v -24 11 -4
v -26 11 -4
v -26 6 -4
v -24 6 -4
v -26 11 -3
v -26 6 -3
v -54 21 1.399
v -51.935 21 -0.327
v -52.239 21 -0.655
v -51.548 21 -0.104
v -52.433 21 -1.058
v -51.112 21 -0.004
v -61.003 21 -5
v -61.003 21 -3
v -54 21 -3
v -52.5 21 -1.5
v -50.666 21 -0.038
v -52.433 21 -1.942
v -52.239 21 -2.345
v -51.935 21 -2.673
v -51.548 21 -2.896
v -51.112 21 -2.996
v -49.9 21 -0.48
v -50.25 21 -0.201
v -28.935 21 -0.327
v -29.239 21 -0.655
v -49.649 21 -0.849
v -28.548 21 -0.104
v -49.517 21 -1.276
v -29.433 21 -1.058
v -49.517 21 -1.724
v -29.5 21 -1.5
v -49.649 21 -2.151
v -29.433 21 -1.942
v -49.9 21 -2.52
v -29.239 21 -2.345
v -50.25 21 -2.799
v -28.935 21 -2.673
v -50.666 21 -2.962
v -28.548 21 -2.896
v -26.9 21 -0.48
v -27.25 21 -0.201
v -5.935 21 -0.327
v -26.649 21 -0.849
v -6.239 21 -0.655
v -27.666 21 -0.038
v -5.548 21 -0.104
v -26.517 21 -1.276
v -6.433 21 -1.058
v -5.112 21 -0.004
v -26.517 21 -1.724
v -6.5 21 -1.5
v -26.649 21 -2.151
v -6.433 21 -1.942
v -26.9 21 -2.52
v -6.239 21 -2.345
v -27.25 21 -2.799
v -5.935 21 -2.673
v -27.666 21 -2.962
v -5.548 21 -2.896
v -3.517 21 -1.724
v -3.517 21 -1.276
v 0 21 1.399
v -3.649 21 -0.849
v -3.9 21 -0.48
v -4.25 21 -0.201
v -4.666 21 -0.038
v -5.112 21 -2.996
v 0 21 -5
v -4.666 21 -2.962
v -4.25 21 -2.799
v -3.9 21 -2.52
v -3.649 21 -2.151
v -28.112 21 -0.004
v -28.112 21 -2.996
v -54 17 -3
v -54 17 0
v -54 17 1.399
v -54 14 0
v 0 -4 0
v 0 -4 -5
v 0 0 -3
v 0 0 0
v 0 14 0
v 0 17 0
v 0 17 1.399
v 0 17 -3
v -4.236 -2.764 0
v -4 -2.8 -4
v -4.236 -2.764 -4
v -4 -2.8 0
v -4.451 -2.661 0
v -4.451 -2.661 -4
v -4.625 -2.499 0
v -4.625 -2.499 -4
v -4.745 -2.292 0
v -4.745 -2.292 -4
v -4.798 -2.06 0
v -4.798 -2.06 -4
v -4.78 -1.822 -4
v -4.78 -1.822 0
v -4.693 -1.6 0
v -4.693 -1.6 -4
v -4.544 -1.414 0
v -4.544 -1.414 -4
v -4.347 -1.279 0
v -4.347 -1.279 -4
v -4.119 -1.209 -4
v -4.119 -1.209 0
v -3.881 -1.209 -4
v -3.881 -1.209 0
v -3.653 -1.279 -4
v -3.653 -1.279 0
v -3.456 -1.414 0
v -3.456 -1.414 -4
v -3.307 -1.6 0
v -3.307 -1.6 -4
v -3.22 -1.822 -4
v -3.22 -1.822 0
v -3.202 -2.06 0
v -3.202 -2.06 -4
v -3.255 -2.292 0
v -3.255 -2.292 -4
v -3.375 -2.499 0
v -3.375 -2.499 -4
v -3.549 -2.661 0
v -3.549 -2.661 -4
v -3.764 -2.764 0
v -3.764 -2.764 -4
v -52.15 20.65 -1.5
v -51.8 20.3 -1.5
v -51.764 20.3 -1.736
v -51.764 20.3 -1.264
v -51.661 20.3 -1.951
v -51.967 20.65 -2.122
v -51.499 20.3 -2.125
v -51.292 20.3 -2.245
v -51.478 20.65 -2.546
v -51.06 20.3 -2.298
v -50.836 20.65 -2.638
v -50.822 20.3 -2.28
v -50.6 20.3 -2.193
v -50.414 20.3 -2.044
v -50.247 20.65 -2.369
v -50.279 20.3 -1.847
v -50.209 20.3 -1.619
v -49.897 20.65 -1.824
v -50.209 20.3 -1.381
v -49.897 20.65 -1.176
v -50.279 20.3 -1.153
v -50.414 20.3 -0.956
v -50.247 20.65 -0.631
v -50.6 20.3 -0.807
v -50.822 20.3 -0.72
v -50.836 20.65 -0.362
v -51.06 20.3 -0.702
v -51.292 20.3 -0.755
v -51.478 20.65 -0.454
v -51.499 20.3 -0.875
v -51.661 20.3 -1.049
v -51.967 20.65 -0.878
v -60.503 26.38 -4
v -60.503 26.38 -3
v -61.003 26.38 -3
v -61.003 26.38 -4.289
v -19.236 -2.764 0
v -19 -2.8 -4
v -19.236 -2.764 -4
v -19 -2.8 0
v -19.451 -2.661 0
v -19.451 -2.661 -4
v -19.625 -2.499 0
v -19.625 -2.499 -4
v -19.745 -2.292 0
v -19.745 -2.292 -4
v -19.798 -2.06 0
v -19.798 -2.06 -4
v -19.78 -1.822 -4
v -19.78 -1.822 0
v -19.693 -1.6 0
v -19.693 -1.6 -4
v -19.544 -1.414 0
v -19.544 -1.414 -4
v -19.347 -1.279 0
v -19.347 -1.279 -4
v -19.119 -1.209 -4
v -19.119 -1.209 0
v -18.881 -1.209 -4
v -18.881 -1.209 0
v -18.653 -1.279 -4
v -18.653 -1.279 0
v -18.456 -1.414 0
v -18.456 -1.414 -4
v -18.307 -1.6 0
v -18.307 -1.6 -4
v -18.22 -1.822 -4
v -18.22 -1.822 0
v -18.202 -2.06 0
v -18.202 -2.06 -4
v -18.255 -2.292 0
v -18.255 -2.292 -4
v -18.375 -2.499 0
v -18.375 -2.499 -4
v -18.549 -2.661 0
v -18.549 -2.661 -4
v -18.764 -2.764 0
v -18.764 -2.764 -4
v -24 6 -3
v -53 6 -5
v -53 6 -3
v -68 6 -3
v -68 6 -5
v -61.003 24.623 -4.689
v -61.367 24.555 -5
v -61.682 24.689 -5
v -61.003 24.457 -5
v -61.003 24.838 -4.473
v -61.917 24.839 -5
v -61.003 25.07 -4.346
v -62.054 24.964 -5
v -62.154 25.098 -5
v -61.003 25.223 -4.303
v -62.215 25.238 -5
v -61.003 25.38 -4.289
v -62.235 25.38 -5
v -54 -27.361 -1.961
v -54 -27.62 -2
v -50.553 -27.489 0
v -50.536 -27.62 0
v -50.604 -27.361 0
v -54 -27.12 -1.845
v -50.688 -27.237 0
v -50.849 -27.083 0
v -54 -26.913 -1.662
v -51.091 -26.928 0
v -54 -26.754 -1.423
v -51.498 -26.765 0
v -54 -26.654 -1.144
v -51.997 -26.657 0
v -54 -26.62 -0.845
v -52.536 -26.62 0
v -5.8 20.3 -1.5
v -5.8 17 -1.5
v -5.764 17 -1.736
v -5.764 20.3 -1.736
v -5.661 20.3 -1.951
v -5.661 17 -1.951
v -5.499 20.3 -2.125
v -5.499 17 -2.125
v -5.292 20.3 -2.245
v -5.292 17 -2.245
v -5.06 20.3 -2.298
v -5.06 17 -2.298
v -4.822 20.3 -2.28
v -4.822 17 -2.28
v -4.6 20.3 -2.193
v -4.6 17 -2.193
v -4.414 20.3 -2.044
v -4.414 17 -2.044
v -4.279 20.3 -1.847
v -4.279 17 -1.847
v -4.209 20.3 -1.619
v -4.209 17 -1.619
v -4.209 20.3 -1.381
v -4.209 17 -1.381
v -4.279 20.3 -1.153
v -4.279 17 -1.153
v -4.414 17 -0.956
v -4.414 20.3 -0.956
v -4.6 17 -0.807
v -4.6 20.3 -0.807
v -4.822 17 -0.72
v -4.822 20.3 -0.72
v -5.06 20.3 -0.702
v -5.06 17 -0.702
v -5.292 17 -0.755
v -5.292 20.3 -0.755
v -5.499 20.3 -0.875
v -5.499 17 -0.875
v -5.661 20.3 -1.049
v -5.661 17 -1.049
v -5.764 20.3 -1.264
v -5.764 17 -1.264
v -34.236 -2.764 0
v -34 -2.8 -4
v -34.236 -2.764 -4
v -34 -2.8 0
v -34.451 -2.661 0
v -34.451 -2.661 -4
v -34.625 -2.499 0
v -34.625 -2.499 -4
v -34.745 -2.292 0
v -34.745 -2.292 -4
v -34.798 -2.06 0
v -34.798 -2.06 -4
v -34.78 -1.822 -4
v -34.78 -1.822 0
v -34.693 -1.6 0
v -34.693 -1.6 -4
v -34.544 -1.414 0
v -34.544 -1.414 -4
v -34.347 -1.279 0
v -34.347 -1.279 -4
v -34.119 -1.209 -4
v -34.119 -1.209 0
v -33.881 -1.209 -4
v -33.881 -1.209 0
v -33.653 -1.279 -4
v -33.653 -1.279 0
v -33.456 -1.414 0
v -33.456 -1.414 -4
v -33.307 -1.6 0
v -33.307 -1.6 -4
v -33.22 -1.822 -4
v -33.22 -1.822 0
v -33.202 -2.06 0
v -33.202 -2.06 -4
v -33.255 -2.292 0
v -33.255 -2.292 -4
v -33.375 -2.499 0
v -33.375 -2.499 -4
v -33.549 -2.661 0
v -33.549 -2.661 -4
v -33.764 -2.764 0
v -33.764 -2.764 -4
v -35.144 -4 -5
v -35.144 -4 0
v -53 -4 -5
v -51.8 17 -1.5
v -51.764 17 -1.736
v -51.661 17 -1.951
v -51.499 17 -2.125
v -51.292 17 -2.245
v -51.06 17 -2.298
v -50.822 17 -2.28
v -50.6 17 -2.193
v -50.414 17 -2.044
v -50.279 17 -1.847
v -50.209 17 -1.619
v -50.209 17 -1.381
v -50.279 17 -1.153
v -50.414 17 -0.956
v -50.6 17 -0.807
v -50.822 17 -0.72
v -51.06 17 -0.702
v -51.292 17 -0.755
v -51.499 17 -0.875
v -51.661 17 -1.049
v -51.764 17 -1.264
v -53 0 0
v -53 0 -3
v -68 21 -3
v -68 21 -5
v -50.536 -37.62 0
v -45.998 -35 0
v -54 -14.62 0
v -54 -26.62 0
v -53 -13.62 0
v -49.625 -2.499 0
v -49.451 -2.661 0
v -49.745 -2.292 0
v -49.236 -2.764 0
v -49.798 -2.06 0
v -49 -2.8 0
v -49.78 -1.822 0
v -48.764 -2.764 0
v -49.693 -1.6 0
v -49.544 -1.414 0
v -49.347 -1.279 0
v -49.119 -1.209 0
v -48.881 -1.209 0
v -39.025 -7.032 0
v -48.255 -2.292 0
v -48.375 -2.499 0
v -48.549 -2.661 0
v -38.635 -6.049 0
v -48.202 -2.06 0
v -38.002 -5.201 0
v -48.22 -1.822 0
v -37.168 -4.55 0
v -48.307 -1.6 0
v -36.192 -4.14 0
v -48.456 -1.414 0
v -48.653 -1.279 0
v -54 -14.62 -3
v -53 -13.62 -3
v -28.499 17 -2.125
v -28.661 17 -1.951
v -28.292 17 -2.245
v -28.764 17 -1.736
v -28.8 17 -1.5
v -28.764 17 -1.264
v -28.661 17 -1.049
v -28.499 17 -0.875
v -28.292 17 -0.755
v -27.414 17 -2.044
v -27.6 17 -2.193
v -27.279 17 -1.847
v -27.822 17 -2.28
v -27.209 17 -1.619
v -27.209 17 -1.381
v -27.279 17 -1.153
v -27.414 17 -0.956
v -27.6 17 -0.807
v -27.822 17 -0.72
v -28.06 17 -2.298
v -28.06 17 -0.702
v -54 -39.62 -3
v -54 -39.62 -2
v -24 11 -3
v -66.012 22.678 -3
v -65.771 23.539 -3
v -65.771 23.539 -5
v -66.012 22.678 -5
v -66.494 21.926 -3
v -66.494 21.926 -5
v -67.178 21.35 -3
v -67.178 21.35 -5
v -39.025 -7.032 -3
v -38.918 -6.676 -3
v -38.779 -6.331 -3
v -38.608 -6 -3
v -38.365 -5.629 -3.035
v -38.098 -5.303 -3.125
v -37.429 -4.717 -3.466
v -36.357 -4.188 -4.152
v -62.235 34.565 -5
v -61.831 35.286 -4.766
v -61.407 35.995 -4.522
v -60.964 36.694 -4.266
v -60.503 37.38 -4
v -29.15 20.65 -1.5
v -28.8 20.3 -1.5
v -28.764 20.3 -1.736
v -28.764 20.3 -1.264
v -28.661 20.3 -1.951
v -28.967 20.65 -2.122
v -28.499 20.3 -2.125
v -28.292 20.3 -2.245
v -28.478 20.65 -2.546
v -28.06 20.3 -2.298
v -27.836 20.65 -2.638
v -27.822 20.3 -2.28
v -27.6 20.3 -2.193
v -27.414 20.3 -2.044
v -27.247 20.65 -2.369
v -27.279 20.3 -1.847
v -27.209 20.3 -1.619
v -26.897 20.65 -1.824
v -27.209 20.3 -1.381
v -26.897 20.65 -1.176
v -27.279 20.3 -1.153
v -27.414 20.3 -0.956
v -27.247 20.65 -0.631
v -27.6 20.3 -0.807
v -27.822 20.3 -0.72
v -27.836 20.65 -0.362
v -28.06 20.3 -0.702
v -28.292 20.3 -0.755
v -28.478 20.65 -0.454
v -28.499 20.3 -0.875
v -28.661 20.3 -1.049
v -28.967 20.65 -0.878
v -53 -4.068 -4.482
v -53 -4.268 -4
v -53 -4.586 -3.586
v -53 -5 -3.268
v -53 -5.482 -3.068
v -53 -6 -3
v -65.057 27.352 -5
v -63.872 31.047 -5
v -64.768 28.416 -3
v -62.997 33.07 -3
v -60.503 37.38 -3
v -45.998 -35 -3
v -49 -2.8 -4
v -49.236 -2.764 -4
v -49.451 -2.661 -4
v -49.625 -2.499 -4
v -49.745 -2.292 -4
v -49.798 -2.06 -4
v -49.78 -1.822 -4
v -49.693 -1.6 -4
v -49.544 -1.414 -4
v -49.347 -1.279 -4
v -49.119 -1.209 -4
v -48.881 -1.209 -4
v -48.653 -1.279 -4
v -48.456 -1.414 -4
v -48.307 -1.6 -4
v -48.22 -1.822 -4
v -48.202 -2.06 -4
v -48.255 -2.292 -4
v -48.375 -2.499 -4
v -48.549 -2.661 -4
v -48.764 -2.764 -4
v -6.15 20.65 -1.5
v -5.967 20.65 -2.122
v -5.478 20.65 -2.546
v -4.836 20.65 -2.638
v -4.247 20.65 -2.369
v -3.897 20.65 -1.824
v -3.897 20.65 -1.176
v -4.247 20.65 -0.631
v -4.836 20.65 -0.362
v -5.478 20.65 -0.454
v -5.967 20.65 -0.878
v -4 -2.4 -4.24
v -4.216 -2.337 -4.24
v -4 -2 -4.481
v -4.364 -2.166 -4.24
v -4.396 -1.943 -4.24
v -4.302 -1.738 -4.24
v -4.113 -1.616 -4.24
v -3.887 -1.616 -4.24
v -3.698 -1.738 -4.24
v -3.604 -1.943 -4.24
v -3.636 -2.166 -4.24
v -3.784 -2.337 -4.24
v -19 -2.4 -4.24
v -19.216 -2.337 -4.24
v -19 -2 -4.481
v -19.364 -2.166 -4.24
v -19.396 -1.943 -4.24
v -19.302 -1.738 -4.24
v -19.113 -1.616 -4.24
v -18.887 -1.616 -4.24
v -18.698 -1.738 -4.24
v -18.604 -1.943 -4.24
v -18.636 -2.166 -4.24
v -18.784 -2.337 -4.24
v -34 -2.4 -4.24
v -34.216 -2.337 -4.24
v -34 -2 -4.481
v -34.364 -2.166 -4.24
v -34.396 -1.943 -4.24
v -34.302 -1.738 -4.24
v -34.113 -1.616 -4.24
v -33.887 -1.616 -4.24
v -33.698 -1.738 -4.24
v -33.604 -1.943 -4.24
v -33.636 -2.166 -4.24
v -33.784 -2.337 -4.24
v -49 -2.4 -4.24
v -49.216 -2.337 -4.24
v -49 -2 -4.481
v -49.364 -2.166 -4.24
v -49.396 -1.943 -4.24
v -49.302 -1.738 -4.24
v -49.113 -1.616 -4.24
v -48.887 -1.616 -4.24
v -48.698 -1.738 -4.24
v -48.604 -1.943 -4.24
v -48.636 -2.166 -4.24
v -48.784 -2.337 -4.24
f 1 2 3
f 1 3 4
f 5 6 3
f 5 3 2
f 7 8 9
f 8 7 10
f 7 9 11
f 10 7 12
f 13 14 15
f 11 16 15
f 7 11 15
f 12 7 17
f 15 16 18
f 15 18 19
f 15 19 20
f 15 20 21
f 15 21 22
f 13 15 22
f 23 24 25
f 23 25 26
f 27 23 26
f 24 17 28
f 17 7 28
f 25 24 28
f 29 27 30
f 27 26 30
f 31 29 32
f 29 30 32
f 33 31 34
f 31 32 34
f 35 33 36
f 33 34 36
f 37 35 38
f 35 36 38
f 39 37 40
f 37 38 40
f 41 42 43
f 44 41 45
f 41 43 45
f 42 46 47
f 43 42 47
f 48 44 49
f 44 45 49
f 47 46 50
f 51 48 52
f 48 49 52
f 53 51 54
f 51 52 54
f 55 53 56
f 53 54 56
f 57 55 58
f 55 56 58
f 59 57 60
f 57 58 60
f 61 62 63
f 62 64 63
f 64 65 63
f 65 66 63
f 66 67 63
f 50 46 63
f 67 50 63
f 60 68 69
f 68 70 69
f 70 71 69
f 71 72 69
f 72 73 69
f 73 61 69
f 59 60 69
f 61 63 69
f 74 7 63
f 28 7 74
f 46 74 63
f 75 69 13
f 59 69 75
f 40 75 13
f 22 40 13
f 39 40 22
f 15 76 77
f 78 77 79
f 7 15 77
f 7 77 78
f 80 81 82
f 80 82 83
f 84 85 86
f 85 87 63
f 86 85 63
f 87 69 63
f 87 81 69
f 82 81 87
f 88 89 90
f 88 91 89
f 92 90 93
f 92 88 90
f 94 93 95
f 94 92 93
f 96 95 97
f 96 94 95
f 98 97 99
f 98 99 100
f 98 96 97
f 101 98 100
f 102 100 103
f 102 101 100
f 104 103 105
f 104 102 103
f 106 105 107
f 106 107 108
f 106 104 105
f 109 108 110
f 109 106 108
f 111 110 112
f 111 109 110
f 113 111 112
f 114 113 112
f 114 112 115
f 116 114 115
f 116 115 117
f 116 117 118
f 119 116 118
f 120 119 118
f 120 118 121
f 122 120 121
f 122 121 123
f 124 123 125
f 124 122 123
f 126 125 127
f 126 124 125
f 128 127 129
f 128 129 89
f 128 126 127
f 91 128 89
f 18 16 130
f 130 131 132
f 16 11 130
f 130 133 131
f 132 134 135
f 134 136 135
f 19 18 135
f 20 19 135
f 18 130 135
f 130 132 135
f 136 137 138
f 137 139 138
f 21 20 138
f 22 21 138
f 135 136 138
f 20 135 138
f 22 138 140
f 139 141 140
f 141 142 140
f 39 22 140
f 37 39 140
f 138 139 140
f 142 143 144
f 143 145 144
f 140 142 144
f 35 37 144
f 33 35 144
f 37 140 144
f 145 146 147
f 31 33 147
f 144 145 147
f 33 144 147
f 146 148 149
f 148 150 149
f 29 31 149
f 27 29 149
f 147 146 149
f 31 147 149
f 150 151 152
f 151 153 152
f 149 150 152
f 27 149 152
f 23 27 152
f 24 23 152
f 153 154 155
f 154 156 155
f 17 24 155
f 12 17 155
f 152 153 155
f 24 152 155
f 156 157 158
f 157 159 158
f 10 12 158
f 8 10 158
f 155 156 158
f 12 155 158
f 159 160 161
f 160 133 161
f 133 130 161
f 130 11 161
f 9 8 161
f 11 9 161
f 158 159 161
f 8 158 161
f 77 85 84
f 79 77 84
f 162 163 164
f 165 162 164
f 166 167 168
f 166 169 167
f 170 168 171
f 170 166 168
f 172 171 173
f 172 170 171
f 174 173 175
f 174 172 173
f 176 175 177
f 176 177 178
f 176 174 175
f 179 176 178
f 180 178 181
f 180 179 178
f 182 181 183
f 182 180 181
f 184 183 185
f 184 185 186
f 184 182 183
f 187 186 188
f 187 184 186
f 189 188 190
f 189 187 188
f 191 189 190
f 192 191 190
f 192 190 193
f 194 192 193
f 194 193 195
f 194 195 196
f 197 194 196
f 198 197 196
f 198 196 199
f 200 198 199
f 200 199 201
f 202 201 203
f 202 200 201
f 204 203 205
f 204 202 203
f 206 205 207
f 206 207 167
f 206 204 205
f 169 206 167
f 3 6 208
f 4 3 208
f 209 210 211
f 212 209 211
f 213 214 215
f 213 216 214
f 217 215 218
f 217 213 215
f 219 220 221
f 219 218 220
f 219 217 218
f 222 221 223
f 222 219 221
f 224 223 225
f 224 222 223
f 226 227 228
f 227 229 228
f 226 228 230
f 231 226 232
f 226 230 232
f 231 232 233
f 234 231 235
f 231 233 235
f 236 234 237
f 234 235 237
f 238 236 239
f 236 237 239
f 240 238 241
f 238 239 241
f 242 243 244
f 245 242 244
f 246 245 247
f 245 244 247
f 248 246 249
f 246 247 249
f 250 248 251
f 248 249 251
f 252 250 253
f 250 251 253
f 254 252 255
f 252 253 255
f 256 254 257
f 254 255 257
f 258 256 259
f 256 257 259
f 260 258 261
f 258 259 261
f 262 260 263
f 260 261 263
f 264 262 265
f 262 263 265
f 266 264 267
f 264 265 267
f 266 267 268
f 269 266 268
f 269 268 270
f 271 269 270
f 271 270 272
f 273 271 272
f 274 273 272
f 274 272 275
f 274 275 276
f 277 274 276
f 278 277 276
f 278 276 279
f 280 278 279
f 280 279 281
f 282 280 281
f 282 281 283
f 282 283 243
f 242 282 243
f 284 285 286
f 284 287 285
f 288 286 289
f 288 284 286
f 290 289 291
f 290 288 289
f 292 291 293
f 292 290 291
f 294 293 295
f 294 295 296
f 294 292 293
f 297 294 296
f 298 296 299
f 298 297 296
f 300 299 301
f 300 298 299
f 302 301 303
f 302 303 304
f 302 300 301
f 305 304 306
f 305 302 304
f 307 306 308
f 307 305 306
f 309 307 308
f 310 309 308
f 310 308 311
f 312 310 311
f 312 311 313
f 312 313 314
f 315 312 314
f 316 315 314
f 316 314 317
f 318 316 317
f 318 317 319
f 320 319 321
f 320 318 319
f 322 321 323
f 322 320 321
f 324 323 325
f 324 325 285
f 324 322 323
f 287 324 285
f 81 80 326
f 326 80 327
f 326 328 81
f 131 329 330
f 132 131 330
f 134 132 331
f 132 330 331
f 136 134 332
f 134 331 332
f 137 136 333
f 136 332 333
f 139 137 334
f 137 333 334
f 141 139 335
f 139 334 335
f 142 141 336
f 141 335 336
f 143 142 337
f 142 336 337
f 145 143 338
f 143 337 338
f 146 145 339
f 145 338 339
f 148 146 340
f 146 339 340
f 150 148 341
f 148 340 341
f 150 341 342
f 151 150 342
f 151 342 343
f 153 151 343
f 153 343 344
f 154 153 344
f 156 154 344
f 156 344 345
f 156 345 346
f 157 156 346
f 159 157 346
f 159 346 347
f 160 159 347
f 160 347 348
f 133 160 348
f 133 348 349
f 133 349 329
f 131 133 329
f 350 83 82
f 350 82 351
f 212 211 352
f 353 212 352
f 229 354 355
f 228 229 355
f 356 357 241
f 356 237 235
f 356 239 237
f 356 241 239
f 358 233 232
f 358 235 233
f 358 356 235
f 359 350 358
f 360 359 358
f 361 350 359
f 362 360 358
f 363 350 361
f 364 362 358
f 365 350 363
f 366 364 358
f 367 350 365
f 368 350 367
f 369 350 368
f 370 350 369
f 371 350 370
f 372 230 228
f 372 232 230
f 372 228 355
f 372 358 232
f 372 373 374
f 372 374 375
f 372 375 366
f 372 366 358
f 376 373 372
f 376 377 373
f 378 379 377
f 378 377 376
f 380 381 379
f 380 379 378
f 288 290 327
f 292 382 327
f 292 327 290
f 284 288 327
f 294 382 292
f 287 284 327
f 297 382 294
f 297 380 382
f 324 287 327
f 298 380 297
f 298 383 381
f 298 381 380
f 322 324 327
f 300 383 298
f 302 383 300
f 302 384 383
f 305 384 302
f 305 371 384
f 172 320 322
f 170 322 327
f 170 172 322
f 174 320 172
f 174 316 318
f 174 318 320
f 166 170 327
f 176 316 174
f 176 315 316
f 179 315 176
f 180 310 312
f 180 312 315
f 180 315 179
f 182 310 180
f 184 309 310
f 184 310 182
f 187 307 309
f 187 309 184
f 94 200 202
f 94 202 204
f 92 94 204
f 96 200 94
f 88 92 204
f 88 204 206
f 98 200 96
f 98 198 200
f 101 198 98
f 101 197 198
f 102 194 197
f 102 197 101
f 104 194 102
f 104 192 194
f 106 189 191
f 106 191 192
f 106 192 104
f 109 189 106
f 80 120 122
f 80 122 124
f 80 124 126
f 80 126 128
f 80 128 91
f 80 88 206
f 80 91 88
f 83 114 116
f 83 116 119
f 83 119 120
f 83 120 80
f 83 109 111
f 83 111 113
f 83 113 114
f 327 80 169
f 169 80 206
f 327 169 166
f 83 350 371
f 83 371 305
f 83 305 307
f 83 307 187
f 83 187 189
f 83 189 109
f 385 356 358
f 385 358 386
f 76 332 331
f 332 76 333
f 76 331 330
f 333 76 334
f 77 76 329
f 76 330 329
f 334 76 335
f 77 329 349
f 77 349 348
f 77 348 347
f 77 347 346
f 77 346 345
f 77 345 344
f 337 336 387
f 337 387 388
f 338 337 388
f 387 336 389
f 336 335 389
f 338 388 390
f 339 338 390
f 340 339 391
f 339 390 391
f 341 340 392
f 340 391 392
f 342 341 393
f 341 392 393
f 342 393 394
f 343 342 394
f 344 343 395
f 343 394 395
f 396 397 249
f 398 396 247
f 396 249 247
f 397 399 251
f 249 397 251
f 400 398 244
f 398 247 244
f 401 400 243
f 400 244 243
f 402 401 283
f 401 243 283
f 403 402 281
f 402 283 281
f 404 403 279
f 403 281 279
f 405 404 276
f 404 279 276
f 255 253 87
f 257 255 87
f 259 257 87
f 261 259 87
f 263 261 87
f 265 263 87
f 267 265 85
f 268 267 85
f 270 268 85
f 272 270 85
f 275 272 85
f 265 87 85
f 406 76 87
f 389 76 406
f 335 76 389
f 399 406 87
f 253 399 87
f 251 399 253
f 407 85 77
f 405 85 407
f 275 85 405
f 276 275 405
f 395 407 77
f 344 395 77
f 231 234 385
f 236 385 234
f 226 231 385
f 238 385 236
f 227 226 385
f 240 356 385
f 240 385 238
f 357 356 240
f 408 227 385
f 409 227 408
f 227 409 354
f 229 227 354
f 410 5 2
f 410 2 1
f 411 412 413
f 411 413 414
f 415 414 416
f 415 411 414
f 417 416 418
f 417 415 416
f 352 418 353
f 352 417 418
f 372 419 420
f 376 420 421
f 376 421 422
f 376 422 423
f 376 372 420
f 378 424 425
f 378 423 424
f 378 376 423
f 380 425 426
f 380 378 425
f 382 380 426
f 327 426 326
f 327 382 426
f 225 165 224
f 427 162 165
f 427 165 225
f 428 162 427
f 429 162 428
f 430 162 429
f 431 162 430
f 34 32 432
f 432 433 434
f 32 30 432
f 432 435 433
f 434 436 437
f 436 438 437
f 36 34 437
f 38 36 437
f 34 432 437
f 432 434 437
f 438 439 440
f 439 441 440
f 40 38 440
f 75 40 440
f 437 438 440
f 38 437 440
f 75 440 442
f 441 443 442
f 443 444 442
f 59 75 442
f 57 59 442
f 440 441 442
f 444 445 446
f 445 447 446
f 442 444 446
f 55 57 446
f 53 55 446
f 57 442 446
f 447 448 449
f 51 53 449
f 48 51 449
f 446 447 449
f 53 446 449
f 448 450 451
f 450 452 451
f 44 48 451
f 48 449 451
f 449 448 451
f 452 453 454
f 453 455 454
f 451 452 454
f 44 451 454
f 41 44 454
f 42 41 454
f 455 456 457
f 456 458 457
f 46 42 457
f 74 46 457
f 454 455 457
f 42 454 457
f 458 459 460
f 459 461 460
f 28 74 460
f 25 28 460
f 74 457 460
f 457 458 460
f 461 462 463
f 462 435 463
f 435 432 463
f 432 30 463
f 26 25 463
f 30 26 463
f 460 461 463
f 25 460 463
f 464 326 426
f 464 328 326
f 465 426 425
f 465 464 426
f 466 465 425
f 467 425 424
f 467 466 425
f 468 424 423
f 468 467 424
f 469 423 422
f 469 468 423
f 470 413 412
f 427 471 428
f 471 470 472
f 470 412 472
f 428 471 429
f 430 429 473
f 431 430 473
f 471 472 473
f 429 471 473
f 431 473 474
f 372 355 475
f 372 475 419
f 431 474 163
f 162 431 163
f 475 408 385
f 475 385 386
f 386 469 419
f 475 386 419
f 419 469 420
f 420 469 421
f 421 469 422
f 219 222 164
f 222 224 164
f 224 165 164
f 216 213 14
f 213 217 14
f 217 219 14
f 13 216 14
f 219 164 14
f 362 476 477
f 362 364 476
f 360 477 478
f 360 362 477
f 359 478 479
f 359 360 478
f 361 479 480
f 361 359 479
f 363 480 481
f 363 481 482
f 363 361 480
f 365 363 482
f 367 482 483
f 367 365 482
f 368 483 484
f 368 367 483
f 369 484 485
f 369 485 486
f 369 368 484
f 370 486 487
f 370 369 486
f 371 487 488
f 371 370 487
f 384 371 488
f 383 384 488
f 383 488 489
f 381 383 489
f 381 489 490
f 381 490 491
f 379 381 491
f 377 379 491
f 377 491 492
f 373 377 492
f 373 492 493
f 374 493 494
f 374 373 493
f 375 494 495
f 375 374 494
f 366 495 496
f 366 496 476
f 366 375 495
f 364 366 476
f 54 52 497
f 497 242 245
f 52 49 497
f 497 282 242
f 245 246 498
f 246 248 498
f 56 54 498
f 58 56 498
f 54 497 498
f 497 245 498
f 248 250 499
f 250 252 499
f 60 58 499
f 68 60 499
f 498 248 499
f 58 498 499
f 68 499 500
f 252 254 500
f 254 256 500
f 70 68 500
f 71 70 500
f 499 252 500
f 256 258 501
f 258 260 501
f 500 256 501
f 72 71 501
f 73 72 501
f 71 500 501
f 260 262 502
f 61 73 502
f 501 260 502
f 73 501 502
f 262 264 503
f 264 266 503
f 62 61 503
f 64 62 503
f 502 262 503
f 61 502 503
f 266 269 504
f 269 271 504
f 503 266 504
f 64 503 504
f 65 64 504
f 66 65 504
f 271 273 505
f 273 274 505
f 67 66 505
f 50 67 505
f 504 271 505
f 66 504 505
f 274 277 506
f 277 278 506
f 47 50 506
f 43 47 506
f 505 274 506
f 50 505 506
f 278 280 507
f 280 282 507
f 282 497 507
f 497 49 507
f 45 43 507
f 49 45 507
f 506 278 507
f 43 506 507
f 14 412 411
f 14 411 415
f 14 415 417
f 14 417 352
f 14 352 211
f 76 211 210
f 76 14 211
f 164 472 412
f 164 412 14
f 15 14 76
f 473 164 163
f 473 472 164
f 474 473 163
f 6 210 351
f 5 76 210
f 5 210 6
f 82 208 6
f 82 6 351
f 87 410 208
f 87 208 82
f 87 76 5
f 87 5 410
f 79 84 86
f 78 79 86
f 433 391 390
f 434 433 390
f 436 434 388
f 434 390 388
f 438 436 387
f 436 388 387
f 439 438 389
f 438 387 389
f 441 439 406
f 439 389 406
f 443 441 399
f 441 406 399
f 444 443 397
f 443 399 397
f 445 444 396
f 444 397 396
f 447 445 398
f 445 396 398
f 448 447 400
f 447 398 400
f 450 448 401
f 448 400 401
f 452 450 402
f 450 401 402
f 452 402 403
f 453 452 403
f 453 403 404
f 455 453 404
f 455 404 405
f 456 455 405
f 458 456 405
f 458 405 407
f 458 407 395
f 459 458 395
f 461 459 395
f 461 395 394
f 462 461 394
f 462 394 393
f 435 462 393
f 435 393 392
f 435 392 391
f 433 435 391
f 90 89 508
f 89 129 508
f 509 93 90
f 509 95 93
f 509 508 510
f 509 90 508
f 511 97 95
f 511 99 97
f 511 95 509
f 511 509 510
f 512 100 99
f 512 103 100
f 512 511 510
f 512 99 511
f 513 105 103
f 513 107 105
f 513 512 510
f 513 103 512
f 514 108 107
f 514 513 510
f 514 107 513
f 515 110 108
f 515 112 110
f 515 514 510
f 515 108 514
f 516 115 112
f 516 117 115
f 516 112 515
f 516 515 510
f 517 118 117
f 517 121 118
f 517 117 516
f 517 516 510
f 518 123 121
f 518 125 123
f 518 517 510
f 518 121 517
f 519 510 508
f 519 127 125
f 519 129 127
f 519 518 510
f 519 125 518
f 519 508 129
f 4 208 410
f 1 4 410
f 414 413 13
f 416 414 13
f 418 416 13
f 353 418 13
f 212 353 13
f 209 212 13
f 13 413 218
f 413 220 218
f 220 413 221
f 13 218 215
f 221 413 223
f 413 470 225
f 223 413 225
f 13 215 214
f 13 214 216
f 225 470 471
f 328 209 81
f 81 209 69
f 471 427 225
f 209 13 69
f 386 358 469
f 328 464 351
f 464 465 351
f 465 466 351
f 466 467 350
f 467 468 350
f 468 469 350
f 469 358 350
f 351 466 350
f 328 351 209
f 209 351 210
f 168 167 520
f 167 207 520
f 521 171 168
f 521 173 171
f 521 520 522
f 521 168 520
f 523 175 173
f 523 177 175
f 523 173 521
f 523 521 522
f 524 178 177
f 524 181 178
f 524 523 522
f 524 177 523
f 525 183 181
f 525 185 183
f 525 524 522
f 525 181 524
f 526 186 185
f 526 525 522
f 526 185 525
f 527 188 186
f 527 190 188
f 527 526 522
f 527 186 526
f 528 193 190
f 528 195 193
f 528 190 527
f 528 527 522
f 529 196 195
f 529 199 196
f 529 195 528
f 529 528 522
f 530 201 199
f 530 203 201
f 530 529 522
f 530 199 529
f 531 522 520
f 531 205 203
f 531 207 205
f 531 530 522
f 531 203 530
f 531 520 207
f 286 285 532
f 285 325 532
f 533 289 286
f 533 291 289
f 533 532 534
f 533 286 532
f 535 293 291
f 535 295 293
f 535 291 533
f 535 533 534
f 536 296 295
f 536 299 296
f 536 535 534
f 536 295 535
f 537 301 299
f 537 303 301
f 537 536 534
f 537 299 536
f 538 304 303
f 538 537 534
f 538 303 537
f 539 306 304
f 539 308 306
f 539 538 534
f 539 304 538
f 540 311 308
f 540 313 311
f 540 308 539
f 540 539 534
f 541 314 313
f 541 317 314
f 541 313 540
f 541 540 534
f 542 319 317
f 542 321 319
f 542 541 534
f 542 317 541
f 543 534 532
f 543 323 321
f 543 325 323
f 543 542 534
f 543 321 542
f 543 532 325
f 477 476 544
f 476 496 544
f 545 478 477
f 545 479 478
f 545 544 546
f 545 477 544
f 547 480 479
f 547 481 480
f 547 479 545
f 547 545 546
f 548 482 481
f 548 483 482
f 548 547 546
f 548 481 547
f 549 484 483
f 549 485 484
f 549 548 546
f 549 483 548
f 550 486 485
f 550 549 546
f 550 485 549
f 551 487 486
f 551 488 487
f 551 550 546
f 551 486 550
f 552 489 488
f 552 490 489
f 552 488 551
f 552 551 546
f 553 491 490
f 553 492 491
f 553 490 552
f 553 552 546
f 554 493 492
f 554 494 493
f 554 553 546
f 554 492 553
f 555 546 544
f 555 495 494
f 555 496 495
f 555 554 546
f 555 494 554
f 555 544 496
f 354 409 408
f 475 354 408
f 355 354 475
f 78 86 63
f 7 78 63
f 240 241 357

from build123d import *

# Parameters (mm, degrees)
EXTRUDE_1_DEPTH              = 3
EXTRUDE_2_DEPTH              = 2
FILLET_1_R                   = 2
FILLET_2_R                   = 3
CHAMFER_1_SIZE               = 1
EXTRUDE_3_DEPTH              = 54
PATTERN_LINEAR_1_COUNT       = 4
PATTERN_LINEAR_1_PITCH       = 15
HOLE_WIZARD_M2_2_D           = 1.6
HOLE_WIZARD_M2_2_DEPTH       = 4
HOLE_WIZARD_M2_2_CSINK_D     = 3
HOLE_WIZARD_M2_2_CSINK_ANGLE = 90
PATTERN_LINEAR_2_COUNT       = 3
PATTERN_LINEAR_2_PITCH       = 23
CUT_EXTRUDE_1_DEPTH          = 13
FILLET_3_R                   = 1
CUT_EXTRUDE_2_DEPTH          = 13
FILLET_4_R                   = 1
SKETCH_11_W                  = 2.000000000000007
SKETCH_11_H                  = 5
CUT_EXTRUDE_3_DEPTH          = 1


# Some blends are built 0.0001 mm under size
with BuildPart() as part:
    # 草图1 → 凸台-拉伸1 (new body)
    with BuildSketch(Plane.XY):
        with BuildLine():
            Line((-53, -8.000000000000004), (-53, -14.620000000000001))
            Line((-53, -14.620000000000001), (-54, -14.620000000000001))
            Line((-54, -14.620000000000001), (-54, -39.62))
            Line((-54, -39.62), (-45.9979252690319, -35.00000000000001))
            Line((-45.9979252690319, -35.00000000000001), (-39.02479757997029, -7.032312417601319))
            ThreePointArc((-39.02479757997029, -7.032312417601319), (-37.606260576168935, -4.847956985573115), (-35.14361467486631, -4.000000000000005))
            Line((-35.14361467486631, -4.000000000000005), (4.9e-16, -4))
            Line((4.9e-16, -4), (0, 0))
            Line((0, 0), (-53, 0))
            Line((-53, 0), (-53, -8.000000000000004))
        make_face()
    extrude(amount=-EXTRUDE_1_DEPTH)

    # 草图2 → 凸台-拉伸2 (add)
    with BuildSketch(Plane(origin=(0, 0, -3), x_dir=(-1, 0, 0), z_dir=(0, 0, -1))):
        with BuildLine():
            Line((-4.9e-16, -4), (53, -4))
            Line((53, -4), (53, 6.000000000000002))
            Line((53, 6.000000000000002), (68, 6.000000000000002))
            Line((68, 6.000000000000002), (68, 21))
            Line((68, 21), (65.97847727, 21.000000000000004))
            ThreePointArc((65.97847727, 21.000000000000004), (64.40463560690391, 29.57899182713432), (60.50330893032099, 37.379999999999995))
            Line((60.50330893032099, 37.379999999999995), (60.503308930321, 26.379999999999995))
            Line((60.503308930321, 26.379999999999995), (61.003308930321, 26.38))
            Line((61.003308930321, 26.38), (61.003308930321005, 21))
            Line((61.003308930321005, 21), (53, 21))
            Line((53, 21), (0, 21))
            Line((0, 21), (-4.9e-16, -4))
        make_face()
    extrude(amount=EXTRUDE_2_DEPTH)

    # 圆角1
    fillet_1_edges = [part.edges().sort_by_distance(p)[0] for p in [
        (-44.07180733743316, -4, -3),
    ]]
    fillet(fillet_1_edges, radius=FILLET_1_R - 0.0001)  # a hair under: the kernel refuses the full size

    # 圆角2
    # the kernel refuses this fillet: 3 mm, written as the material it adds along each edge
    with BuildSketch(Plane(origin=(-65.97847727, 21.000000000000004, -3), x_dir=(-1, -3.51e-15, 0), z_dir=(0, 0, -1))) as fillet_2_piece_1:
        with BuildLine():
            CenterArc((2.7704921372998013, 2.9050034125503172), FILLET_2_R, 187.01700367904854, 68.52581158586304)
            Line((-0.2070376849391327, 2.5385117241346675), (-0.2665882813839122, 2.531181890366354))
            ThreePointArc((-0.2665882813839122, 2.531181890366354), (-0.13723895323484658, 1.2665056940841235), (-0.05995131454466218, -0.00241658526998755))
            Line((-0.05995131454466218, -0.00241658526998755), (2.1e-16, -0.05999999999999872))
            ThreePointArc((2.1e-16, -0.05999999999999872), (1.0107613649999936, -0.05999999999999517), (2.006543341853998, -0.05810006825100805))
            Line((2.006543341853998, -0.05810006825100805), (2.021522730000001, 0))
        make_face()
    extrude(amount=2)

    # 倒角1
    chamfer_1_edges = [part.edges().sort_by_distance(p)[0] for p in [
        (-53, -14.620000000000001, -1.5),
    ]]
    chamfer(chamfer_1_edges, length=CHAMFER_1_SIZE - 0.0001)  # a hair under: the kernel refuses the full size

    # 草图3 → 凸台-拉伸3 (add)
    with BuildSketch(Plane(origin=(0, 0, 0), x_dir=(0, 0, -1), z_dir=(1, 1.2e-16, 0))):
        Polygon((1.3e-15, 17), (1.73e-15, 14.000000000000002), (-1.3989229744649714, 17), (-1.3989229744649718, 21), (3, 21), (3.0000000000000018, 17), align=None)
    extrude(amount=-EXTRUDE_3_DEPTH)

    # 草图6 → M2 螺纹孔1 (revolve, cut)
    with BuildSketch(Plane(origin=(-4, -1.9999999999999967, 0), x_dir=(0, -1, 0), z_dir=(1, 0, 0))):
        Polygon((0, 0), (-1.1e-15, 4.480688495222049), (0.7999999999999986, 4), (0.7999999999999899, -1.46e-15), align=None)
    hole_wizard_m2_1 = revolve(axis=Axis((-4, -1.9999999999999967, 6.349999999999991), (0, 0, -1)), mode=Mode.SUBTRACT)

    # 阵列(线性)1: M2 螺纹孔1 ×4
    with Locations(*[(-i * PATTERN_LINEAR_1_PITCH, 0, 0) for i in range(1, PATTERN_LINEAR_1_COUNT)]):
        add(hole_wizard_m2_1, mode=Mode.SUBTRACT)

    # M2 螺纹孔2
    with Locations(Plane(origin=(0, 21, 0), x_dir=(1, 0, 0), z_dir=(0, 1, 0))):
        with Locations((-5, 1.5)):
            hole_wizard_m2_2 = CounterSinkHole(HOLE_WIZARD_M2_2_D / 2, HOLE_WIZARD_M2_2_CSINK_D / 2, depth=HOLE_WIZARD_M2_2_DEPTH, counter_sink_angle=HOLE_WIZARD_M2_2_CSINK_ANGLE)

    # 阵列(线性)2: M2 螺纹孔2 ×3
    with Locations(*[(-i * PATTERN_LINEAR_2_PITCH, 0, 0) for i in range(1, PATTERN_LINEAR_2_COUNT)]):
        add(hole_wizard_m2_2, mode=Mode.SUBTRACT)

    # 草图9 → 切除-拉伸1 (cut)
    with BuildSketch(Plane(origin=(3.89e-15, 37.37999999999999, 7.21e-15), x_dir=(1, -1e-16, 0), z_dir=(1e-16, 1, 1.9e-16))):
        Polygon((-60.503308930321, 4.000000000000004), (-62.23535973788988, 5.000000000000007), (-60.503308930321, 5.000000000000007), align=None)
    extrude(amount=-CUT_EXTRUDE_1_DEPTH, mode=Mode.SUBTRACT)

    # 圆角3
    # the kernel refuses this fillet: 1 mm, written as the material it adds along each edge
    with BuildSketch(Plane(origin=(-58.8382454208599, 24.379999999999995, -3.0386751345948144), x_dir=(1.6e-16, 1, 9e-17), z_dir=(-0.8660254037844387, 0, -0.5))) as fillet_3_piece_1_section:
        with BuildLine():
            CenterArc((FILLET_3_R, FILLET_3_R), FILLET_3_R, 179.99999999999997, 90)
            Line((0, FILLET_3_R), (0, 0))
            Line((0, 0), (FILLET_3_R, 0))
        make_face()
    fillet_3_piece_1 = extrude(amount=6.422649730810377, mode=Mode.PRIVATE)
    fillet_3_piece_1 = split(fillet_3_piece_1, bisect_by=Plane(origin=(-61.495158067637725, 24.669870904160934, -5), z_dir=(0, 0, 1)), keep=Keep.TOP, mode=Mode.PRIVATE)
    fillet_3_piece_1 = split(fillet_3_piece_1, bisect_by=Plane(origin=(-61.003308930321, 24.669870904160934, -4.716030766640193), z_dir=(-1, 1.32e-15, 0)), keep=Keep.TOP, mode=Mode.PRIVATE)
    add(fillet_3_piece_1)

    # 草图10 → 切除-拉伸2 (cut)
    with BuildSketch(Plane(origin=(0, -39.62, 0), x_dir=(1, 0, 0), z_dir=(0, 1, 0))):
        Polygon((-54, 2), (-50.53589838486226, 0), (-54, 1.73e-15), align=None)
    extrude(amount=CUT_EXTRUDE_2_DEPTH, mode=Mode.SUBTRACT)

    # 圆角4
    fillet_4_edges = [part.edges().sort_by_distance(p)[0] for p in [
        (-52.26794919243113, -26.619999999999997, -1),
    ]]
    fillet(fillet_4_edges, radius=FILLET_4_R)

    # 草图11 → 切除-拉伸3 (cut)
    with BuildSketch(Plane.XY.offset(-3)):
        with Locations((-25, 8.5)):
            Rectangle(SKETCH_11_W, SKETCH_11_H)
    extrude(amount=-CUT_EXTRUDE_3_DEPTH, mode=Mode.SUBTRACT)


solid = part.part
